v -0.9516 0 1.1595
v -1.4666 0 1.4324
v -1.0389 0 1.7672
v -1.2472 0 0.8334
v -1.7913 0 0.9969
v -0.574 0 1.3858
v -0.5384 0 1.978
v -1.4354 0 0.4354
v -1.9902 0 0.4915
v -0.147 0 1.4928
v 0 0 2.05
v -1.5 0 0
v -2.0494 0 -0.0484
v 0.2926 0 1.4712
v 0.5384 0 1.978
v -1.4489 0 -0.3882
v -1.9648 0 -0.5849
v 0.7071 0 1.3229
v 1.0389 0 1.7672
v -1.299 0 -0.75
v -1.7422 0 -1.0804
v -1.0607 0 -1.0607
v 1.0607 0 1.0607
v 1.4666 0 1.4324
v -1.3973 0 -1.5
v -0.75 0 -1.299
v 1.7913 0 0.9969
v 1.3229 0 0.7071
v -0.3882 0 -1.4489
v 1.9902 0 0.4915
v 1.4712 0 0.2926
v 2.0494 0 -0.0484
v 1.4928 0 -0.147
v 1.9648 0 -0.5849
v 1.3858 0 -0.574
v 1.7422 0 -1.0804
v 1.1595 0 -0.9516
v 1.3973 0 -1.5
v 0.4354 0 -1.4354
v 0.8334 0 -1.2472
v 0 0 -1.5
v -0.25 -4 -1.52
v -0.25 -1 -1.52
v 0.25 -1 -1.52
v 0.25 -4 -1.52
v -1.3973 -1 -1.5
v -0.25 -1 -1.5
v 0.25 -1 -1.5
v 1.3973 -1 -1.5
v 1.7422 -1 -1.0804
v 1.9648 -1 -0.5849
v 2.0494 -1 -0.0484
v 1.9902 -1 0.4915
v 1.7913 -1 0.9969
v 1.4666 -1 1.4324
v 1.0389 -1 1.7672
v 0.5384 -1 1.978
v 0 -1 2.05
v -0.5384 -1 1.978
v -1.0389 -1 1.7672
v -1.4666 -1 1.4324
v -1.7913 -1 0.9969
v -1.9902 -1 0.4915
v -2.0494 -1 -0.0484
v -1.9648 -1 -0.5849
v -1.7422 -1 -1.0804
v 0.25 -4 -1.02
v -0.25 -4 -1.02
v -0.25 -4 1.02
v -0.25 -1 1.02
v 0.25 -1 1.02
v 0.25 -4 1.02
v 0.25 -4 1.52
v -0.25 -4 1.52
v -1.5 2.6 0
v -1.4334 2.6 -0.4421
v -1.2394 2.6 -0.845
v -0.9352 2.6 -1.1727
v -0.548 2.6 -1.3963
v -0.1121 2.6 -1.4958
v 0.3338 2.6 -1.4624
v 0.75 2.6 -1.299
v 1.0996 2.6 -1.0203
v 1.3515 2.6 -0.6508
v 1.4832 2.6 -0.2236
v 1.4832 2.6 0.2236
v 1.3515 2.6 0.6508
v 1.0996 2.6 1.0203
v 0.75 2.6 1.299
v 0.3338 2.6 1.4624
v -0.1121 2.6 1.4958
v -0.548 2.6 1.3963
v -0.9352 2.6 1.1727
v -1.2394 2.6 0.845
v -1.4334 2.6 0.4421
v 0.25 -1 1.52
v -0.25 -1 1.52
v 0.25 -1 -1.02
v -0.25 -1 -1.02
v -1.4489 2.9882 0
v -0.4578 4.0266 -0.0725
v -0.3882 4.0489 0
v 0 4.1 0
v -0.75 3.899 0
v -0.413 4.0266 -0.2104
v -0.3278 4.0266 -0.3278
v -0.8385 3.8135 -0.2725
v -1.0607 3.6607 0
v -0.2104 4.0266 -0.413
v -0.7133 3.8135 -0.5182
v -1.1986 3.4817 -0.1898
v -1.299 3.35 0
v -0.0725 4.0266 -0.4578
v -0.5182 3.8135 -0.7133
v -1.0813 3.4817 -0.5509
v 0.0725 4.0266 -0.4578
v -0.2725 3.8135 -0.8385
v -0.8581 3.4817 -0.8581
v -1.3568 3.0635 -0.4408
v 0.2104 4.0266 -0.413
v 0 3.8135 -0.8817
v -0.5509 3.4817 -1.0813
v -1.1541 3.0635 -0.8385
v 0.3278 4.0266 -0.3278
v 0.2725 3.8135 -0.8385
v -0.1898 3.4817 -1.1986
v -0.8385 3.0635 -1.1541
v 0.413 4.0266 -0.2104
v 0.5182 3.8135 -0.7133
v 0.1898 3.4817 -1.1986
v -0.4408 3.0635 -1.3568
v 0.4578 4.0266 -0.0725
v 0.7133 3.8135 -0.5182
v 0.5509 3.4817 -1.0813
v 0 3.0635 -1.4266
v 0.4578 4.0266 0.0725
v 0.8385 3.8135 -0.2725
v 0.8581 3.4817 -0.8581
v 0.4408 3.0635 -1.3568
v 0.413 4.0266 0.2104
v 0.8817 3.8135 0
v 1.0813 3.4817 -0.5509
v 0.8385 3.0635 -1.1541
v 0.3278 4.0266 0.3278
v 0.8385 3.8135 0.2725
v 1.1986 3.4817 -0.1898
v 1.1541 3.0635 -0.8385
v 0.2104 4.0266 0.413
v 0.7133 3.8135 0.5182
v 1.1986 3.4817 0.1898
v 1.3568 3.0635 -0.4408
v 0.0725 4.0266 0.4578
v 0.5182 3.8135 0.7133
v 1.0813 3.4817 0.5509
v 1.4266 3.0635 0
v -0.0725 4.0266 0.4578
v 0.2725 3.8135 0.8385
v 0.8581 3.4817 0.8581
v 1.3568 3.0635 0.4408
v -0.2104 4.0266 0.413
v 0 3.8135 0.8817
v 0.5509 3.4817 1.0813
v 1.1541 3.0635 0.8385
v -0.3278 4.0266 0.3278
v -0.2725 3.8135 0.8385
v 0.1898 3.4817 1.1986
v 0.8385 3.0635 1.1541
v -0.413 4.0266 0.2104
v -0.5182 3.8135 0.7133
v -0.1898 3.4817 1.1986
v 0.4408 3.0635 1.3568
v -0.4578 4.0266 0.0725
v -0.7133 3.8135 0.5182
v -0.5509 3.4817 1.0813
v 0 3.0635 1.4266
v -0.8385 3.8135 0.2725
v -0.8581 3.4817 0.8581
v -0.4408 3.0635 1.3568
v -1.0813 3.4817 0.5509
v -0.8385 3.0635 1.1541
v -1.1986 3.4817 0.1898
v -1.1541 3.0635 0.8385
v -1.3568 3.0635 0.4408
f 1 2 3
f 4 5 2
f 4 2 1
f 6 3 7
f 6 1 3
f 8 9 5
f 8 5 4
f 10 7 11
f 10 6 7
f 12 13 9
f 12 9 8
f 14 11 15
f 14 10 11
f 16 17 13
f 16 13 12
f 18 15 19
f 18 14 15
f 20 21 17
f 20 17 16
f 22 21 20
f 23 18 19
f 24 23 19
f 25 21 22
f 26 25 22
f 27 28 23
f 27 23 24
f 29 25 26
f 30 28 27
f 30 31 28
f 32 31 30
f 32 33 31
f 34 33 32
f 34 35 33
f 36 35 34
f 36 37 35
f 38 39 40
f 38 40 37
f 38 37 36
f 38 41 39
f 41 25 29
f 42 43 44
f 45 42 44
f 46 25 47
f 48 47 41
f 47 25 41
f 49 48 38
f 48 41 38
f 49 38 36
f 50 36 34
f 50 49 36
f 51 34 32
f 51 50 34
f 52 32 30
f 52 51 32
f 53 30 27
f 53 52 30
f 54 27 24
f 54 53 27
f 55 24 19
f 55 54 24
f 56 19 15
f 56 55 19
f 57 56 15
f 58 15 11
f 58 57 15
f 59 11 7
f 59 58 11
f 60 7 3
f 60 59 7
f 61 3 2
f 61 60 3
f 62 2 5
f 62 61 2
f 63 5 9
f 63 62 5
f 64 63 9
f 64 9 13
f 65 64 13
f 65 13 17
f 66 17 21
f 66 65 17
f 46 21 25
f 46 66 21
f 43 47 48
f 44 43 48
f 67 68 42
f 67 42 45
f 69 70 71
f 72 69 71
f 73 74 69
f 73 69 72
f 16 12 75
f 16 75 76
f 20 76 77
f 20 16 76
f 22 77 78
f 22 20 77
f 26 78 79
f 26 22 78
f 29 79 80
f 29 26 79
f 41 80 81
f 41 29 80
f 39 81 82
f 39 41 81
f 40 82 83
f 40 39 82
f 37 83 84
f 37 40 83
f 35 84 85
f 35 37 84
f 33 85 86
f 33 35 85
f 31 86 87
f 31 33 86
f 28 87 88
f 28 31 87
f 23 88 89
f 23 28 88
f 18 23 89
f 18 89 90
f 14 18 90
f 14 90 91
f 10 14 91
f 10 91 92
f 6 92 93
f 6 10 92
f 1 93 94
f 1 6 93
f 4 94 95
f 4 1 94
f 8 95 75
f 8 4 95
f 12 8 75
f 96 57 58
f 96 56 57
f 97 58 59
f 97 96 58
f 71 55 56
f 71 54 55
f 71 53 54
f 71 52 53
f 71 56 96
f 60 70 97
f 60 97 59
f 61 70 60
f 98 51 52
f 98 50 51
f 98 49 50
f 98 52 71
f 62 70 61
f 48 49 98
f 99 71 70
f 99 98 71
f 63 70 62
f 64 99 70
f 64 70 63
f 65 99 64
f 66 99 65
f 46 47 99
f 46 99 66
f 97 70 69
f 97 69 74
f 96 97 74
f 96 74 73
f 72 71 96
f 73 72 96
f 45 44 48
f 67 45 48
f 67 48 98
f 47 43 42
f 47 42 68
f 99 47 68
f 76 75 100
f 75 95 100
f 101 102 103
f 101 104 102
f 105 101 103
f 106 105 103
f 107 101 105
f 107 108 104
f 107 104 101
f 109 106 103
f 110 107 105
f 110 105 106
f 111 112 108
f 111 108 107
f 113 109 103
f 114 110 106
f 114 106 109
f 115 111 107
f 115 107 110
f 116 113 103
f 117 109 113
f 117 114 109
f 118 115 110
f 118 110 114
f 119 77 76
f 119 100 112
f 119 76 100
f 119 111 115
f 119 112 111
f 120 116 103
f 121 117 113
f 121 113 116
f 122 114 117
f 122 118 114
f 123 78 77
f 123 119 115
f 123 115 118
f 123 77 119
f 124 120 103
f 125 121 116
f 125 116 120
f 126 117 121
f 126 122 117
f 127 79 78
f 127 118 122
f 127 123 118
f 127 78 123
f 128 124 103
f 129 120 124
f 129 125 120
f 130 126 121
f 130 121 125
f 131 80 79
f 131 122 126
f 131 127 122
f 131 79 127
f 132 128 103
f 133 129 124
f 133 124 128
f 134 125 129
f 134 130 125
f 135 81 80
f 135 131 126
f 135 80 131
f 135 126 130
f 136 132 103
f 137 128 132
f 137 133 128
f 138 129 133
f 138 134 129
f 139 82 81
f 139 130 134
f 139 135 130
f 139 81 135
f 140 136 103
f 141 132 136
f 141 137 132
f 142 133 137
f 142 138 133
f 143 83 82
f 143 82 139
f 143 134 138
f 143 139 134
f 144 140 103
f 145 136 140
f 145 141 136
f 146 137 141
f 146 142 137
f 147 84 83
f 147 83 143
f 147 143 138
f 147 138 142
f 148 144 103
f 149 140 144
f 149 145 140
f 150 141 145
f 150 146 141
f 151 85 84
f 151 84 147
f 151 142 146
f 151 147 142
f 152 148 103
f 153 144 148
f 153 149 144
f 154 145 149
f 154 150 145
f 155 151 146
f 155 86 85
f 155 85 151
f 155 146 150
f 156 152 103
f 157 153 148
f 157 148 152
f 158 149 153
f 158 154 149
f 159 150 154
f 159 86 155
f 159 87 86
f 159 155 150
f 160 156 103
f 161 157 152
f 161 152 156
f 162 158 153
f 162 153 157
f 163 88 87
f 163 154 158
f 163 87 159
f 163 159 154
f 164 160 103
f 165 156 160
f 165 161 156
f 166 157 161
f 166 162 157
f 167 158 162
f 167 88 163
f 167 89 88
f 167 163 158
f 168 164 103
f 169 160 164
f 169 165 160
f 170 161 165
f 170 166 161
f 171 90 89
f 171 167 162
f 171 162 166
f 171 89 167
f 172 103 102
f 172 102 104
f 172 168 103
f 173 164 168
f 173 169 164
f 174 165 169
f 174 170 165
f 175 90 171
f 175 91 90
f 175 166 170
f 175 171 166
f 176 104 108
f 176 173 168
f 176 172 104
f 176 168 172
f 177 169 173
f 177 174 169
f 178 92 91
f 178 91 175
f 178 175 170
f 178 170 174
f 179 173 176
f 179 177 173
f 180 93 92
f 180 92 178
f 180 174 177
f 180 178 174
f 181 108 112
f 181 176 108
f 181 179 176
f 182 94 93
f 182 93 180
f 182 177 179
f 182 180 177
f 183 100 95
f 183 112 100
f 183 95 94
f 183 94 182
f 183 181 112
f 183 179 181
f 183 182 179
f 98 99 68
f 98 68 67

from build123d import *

# Parameters (mm, degrees)
CUT_EXTRUDE1_DEPTH  = 2
SKETCH3_W           = 0.5
SKETCH3_H           = 0.5
BOSS_EXTRUDE1_DEPTH = 3


with BuildPart() as part:
    # Sketch1 → Revolve1 (revolve)
    with BuildSketch(Plane.XY):
        with BuildLine():
            Line((-1.5, 2.6), (-1.5, 0))
            Line((-1.5, 0), (-2.05, 0))
            Line((-2.05, 0), (-2.05, -1))
            Line((-2.05, -1), (0, -1))
            Line((0, -1), (0, 4.1))
            ThreePointArc((0, 4.1), (-1.060660172, 3.660660172), (-1.5, 2.6))
        make_face()
    revolve(axis=Axis((0, 4.1, 0), (0, -1, 0)))

    # Sketch2 → Cut-Extrude1 (cut, through all)
    with BuildSketch(Plane(origin=(0, 0, 0), x_dir=(1, 0, 0), z_dir=(0, 1, 0))):
        Polygon((-1.949403326, 1.5), (2.097394678, 1.5), (0.505211857, 3.403801095), align=None)
    extrude(amount=-CUT_EXTRUDE1_DEPTH, mode=Mode.SUBTRACT)

    # Sketch3 → Boss-Extrude1 (add)
    with BuildSketch(Plane.XZ.offset(1)):
        with Locations((0, 1.27)):
            Rectangle(SKETCH3_W, SKETCH3_H)
        with Locations((0, -1.27)):
            Rectangle(SKETCH3_W, SKETCH3_H)
    extrude(amount=BOSS_EXTRUDE1_DEPTH)


solid = part.part
